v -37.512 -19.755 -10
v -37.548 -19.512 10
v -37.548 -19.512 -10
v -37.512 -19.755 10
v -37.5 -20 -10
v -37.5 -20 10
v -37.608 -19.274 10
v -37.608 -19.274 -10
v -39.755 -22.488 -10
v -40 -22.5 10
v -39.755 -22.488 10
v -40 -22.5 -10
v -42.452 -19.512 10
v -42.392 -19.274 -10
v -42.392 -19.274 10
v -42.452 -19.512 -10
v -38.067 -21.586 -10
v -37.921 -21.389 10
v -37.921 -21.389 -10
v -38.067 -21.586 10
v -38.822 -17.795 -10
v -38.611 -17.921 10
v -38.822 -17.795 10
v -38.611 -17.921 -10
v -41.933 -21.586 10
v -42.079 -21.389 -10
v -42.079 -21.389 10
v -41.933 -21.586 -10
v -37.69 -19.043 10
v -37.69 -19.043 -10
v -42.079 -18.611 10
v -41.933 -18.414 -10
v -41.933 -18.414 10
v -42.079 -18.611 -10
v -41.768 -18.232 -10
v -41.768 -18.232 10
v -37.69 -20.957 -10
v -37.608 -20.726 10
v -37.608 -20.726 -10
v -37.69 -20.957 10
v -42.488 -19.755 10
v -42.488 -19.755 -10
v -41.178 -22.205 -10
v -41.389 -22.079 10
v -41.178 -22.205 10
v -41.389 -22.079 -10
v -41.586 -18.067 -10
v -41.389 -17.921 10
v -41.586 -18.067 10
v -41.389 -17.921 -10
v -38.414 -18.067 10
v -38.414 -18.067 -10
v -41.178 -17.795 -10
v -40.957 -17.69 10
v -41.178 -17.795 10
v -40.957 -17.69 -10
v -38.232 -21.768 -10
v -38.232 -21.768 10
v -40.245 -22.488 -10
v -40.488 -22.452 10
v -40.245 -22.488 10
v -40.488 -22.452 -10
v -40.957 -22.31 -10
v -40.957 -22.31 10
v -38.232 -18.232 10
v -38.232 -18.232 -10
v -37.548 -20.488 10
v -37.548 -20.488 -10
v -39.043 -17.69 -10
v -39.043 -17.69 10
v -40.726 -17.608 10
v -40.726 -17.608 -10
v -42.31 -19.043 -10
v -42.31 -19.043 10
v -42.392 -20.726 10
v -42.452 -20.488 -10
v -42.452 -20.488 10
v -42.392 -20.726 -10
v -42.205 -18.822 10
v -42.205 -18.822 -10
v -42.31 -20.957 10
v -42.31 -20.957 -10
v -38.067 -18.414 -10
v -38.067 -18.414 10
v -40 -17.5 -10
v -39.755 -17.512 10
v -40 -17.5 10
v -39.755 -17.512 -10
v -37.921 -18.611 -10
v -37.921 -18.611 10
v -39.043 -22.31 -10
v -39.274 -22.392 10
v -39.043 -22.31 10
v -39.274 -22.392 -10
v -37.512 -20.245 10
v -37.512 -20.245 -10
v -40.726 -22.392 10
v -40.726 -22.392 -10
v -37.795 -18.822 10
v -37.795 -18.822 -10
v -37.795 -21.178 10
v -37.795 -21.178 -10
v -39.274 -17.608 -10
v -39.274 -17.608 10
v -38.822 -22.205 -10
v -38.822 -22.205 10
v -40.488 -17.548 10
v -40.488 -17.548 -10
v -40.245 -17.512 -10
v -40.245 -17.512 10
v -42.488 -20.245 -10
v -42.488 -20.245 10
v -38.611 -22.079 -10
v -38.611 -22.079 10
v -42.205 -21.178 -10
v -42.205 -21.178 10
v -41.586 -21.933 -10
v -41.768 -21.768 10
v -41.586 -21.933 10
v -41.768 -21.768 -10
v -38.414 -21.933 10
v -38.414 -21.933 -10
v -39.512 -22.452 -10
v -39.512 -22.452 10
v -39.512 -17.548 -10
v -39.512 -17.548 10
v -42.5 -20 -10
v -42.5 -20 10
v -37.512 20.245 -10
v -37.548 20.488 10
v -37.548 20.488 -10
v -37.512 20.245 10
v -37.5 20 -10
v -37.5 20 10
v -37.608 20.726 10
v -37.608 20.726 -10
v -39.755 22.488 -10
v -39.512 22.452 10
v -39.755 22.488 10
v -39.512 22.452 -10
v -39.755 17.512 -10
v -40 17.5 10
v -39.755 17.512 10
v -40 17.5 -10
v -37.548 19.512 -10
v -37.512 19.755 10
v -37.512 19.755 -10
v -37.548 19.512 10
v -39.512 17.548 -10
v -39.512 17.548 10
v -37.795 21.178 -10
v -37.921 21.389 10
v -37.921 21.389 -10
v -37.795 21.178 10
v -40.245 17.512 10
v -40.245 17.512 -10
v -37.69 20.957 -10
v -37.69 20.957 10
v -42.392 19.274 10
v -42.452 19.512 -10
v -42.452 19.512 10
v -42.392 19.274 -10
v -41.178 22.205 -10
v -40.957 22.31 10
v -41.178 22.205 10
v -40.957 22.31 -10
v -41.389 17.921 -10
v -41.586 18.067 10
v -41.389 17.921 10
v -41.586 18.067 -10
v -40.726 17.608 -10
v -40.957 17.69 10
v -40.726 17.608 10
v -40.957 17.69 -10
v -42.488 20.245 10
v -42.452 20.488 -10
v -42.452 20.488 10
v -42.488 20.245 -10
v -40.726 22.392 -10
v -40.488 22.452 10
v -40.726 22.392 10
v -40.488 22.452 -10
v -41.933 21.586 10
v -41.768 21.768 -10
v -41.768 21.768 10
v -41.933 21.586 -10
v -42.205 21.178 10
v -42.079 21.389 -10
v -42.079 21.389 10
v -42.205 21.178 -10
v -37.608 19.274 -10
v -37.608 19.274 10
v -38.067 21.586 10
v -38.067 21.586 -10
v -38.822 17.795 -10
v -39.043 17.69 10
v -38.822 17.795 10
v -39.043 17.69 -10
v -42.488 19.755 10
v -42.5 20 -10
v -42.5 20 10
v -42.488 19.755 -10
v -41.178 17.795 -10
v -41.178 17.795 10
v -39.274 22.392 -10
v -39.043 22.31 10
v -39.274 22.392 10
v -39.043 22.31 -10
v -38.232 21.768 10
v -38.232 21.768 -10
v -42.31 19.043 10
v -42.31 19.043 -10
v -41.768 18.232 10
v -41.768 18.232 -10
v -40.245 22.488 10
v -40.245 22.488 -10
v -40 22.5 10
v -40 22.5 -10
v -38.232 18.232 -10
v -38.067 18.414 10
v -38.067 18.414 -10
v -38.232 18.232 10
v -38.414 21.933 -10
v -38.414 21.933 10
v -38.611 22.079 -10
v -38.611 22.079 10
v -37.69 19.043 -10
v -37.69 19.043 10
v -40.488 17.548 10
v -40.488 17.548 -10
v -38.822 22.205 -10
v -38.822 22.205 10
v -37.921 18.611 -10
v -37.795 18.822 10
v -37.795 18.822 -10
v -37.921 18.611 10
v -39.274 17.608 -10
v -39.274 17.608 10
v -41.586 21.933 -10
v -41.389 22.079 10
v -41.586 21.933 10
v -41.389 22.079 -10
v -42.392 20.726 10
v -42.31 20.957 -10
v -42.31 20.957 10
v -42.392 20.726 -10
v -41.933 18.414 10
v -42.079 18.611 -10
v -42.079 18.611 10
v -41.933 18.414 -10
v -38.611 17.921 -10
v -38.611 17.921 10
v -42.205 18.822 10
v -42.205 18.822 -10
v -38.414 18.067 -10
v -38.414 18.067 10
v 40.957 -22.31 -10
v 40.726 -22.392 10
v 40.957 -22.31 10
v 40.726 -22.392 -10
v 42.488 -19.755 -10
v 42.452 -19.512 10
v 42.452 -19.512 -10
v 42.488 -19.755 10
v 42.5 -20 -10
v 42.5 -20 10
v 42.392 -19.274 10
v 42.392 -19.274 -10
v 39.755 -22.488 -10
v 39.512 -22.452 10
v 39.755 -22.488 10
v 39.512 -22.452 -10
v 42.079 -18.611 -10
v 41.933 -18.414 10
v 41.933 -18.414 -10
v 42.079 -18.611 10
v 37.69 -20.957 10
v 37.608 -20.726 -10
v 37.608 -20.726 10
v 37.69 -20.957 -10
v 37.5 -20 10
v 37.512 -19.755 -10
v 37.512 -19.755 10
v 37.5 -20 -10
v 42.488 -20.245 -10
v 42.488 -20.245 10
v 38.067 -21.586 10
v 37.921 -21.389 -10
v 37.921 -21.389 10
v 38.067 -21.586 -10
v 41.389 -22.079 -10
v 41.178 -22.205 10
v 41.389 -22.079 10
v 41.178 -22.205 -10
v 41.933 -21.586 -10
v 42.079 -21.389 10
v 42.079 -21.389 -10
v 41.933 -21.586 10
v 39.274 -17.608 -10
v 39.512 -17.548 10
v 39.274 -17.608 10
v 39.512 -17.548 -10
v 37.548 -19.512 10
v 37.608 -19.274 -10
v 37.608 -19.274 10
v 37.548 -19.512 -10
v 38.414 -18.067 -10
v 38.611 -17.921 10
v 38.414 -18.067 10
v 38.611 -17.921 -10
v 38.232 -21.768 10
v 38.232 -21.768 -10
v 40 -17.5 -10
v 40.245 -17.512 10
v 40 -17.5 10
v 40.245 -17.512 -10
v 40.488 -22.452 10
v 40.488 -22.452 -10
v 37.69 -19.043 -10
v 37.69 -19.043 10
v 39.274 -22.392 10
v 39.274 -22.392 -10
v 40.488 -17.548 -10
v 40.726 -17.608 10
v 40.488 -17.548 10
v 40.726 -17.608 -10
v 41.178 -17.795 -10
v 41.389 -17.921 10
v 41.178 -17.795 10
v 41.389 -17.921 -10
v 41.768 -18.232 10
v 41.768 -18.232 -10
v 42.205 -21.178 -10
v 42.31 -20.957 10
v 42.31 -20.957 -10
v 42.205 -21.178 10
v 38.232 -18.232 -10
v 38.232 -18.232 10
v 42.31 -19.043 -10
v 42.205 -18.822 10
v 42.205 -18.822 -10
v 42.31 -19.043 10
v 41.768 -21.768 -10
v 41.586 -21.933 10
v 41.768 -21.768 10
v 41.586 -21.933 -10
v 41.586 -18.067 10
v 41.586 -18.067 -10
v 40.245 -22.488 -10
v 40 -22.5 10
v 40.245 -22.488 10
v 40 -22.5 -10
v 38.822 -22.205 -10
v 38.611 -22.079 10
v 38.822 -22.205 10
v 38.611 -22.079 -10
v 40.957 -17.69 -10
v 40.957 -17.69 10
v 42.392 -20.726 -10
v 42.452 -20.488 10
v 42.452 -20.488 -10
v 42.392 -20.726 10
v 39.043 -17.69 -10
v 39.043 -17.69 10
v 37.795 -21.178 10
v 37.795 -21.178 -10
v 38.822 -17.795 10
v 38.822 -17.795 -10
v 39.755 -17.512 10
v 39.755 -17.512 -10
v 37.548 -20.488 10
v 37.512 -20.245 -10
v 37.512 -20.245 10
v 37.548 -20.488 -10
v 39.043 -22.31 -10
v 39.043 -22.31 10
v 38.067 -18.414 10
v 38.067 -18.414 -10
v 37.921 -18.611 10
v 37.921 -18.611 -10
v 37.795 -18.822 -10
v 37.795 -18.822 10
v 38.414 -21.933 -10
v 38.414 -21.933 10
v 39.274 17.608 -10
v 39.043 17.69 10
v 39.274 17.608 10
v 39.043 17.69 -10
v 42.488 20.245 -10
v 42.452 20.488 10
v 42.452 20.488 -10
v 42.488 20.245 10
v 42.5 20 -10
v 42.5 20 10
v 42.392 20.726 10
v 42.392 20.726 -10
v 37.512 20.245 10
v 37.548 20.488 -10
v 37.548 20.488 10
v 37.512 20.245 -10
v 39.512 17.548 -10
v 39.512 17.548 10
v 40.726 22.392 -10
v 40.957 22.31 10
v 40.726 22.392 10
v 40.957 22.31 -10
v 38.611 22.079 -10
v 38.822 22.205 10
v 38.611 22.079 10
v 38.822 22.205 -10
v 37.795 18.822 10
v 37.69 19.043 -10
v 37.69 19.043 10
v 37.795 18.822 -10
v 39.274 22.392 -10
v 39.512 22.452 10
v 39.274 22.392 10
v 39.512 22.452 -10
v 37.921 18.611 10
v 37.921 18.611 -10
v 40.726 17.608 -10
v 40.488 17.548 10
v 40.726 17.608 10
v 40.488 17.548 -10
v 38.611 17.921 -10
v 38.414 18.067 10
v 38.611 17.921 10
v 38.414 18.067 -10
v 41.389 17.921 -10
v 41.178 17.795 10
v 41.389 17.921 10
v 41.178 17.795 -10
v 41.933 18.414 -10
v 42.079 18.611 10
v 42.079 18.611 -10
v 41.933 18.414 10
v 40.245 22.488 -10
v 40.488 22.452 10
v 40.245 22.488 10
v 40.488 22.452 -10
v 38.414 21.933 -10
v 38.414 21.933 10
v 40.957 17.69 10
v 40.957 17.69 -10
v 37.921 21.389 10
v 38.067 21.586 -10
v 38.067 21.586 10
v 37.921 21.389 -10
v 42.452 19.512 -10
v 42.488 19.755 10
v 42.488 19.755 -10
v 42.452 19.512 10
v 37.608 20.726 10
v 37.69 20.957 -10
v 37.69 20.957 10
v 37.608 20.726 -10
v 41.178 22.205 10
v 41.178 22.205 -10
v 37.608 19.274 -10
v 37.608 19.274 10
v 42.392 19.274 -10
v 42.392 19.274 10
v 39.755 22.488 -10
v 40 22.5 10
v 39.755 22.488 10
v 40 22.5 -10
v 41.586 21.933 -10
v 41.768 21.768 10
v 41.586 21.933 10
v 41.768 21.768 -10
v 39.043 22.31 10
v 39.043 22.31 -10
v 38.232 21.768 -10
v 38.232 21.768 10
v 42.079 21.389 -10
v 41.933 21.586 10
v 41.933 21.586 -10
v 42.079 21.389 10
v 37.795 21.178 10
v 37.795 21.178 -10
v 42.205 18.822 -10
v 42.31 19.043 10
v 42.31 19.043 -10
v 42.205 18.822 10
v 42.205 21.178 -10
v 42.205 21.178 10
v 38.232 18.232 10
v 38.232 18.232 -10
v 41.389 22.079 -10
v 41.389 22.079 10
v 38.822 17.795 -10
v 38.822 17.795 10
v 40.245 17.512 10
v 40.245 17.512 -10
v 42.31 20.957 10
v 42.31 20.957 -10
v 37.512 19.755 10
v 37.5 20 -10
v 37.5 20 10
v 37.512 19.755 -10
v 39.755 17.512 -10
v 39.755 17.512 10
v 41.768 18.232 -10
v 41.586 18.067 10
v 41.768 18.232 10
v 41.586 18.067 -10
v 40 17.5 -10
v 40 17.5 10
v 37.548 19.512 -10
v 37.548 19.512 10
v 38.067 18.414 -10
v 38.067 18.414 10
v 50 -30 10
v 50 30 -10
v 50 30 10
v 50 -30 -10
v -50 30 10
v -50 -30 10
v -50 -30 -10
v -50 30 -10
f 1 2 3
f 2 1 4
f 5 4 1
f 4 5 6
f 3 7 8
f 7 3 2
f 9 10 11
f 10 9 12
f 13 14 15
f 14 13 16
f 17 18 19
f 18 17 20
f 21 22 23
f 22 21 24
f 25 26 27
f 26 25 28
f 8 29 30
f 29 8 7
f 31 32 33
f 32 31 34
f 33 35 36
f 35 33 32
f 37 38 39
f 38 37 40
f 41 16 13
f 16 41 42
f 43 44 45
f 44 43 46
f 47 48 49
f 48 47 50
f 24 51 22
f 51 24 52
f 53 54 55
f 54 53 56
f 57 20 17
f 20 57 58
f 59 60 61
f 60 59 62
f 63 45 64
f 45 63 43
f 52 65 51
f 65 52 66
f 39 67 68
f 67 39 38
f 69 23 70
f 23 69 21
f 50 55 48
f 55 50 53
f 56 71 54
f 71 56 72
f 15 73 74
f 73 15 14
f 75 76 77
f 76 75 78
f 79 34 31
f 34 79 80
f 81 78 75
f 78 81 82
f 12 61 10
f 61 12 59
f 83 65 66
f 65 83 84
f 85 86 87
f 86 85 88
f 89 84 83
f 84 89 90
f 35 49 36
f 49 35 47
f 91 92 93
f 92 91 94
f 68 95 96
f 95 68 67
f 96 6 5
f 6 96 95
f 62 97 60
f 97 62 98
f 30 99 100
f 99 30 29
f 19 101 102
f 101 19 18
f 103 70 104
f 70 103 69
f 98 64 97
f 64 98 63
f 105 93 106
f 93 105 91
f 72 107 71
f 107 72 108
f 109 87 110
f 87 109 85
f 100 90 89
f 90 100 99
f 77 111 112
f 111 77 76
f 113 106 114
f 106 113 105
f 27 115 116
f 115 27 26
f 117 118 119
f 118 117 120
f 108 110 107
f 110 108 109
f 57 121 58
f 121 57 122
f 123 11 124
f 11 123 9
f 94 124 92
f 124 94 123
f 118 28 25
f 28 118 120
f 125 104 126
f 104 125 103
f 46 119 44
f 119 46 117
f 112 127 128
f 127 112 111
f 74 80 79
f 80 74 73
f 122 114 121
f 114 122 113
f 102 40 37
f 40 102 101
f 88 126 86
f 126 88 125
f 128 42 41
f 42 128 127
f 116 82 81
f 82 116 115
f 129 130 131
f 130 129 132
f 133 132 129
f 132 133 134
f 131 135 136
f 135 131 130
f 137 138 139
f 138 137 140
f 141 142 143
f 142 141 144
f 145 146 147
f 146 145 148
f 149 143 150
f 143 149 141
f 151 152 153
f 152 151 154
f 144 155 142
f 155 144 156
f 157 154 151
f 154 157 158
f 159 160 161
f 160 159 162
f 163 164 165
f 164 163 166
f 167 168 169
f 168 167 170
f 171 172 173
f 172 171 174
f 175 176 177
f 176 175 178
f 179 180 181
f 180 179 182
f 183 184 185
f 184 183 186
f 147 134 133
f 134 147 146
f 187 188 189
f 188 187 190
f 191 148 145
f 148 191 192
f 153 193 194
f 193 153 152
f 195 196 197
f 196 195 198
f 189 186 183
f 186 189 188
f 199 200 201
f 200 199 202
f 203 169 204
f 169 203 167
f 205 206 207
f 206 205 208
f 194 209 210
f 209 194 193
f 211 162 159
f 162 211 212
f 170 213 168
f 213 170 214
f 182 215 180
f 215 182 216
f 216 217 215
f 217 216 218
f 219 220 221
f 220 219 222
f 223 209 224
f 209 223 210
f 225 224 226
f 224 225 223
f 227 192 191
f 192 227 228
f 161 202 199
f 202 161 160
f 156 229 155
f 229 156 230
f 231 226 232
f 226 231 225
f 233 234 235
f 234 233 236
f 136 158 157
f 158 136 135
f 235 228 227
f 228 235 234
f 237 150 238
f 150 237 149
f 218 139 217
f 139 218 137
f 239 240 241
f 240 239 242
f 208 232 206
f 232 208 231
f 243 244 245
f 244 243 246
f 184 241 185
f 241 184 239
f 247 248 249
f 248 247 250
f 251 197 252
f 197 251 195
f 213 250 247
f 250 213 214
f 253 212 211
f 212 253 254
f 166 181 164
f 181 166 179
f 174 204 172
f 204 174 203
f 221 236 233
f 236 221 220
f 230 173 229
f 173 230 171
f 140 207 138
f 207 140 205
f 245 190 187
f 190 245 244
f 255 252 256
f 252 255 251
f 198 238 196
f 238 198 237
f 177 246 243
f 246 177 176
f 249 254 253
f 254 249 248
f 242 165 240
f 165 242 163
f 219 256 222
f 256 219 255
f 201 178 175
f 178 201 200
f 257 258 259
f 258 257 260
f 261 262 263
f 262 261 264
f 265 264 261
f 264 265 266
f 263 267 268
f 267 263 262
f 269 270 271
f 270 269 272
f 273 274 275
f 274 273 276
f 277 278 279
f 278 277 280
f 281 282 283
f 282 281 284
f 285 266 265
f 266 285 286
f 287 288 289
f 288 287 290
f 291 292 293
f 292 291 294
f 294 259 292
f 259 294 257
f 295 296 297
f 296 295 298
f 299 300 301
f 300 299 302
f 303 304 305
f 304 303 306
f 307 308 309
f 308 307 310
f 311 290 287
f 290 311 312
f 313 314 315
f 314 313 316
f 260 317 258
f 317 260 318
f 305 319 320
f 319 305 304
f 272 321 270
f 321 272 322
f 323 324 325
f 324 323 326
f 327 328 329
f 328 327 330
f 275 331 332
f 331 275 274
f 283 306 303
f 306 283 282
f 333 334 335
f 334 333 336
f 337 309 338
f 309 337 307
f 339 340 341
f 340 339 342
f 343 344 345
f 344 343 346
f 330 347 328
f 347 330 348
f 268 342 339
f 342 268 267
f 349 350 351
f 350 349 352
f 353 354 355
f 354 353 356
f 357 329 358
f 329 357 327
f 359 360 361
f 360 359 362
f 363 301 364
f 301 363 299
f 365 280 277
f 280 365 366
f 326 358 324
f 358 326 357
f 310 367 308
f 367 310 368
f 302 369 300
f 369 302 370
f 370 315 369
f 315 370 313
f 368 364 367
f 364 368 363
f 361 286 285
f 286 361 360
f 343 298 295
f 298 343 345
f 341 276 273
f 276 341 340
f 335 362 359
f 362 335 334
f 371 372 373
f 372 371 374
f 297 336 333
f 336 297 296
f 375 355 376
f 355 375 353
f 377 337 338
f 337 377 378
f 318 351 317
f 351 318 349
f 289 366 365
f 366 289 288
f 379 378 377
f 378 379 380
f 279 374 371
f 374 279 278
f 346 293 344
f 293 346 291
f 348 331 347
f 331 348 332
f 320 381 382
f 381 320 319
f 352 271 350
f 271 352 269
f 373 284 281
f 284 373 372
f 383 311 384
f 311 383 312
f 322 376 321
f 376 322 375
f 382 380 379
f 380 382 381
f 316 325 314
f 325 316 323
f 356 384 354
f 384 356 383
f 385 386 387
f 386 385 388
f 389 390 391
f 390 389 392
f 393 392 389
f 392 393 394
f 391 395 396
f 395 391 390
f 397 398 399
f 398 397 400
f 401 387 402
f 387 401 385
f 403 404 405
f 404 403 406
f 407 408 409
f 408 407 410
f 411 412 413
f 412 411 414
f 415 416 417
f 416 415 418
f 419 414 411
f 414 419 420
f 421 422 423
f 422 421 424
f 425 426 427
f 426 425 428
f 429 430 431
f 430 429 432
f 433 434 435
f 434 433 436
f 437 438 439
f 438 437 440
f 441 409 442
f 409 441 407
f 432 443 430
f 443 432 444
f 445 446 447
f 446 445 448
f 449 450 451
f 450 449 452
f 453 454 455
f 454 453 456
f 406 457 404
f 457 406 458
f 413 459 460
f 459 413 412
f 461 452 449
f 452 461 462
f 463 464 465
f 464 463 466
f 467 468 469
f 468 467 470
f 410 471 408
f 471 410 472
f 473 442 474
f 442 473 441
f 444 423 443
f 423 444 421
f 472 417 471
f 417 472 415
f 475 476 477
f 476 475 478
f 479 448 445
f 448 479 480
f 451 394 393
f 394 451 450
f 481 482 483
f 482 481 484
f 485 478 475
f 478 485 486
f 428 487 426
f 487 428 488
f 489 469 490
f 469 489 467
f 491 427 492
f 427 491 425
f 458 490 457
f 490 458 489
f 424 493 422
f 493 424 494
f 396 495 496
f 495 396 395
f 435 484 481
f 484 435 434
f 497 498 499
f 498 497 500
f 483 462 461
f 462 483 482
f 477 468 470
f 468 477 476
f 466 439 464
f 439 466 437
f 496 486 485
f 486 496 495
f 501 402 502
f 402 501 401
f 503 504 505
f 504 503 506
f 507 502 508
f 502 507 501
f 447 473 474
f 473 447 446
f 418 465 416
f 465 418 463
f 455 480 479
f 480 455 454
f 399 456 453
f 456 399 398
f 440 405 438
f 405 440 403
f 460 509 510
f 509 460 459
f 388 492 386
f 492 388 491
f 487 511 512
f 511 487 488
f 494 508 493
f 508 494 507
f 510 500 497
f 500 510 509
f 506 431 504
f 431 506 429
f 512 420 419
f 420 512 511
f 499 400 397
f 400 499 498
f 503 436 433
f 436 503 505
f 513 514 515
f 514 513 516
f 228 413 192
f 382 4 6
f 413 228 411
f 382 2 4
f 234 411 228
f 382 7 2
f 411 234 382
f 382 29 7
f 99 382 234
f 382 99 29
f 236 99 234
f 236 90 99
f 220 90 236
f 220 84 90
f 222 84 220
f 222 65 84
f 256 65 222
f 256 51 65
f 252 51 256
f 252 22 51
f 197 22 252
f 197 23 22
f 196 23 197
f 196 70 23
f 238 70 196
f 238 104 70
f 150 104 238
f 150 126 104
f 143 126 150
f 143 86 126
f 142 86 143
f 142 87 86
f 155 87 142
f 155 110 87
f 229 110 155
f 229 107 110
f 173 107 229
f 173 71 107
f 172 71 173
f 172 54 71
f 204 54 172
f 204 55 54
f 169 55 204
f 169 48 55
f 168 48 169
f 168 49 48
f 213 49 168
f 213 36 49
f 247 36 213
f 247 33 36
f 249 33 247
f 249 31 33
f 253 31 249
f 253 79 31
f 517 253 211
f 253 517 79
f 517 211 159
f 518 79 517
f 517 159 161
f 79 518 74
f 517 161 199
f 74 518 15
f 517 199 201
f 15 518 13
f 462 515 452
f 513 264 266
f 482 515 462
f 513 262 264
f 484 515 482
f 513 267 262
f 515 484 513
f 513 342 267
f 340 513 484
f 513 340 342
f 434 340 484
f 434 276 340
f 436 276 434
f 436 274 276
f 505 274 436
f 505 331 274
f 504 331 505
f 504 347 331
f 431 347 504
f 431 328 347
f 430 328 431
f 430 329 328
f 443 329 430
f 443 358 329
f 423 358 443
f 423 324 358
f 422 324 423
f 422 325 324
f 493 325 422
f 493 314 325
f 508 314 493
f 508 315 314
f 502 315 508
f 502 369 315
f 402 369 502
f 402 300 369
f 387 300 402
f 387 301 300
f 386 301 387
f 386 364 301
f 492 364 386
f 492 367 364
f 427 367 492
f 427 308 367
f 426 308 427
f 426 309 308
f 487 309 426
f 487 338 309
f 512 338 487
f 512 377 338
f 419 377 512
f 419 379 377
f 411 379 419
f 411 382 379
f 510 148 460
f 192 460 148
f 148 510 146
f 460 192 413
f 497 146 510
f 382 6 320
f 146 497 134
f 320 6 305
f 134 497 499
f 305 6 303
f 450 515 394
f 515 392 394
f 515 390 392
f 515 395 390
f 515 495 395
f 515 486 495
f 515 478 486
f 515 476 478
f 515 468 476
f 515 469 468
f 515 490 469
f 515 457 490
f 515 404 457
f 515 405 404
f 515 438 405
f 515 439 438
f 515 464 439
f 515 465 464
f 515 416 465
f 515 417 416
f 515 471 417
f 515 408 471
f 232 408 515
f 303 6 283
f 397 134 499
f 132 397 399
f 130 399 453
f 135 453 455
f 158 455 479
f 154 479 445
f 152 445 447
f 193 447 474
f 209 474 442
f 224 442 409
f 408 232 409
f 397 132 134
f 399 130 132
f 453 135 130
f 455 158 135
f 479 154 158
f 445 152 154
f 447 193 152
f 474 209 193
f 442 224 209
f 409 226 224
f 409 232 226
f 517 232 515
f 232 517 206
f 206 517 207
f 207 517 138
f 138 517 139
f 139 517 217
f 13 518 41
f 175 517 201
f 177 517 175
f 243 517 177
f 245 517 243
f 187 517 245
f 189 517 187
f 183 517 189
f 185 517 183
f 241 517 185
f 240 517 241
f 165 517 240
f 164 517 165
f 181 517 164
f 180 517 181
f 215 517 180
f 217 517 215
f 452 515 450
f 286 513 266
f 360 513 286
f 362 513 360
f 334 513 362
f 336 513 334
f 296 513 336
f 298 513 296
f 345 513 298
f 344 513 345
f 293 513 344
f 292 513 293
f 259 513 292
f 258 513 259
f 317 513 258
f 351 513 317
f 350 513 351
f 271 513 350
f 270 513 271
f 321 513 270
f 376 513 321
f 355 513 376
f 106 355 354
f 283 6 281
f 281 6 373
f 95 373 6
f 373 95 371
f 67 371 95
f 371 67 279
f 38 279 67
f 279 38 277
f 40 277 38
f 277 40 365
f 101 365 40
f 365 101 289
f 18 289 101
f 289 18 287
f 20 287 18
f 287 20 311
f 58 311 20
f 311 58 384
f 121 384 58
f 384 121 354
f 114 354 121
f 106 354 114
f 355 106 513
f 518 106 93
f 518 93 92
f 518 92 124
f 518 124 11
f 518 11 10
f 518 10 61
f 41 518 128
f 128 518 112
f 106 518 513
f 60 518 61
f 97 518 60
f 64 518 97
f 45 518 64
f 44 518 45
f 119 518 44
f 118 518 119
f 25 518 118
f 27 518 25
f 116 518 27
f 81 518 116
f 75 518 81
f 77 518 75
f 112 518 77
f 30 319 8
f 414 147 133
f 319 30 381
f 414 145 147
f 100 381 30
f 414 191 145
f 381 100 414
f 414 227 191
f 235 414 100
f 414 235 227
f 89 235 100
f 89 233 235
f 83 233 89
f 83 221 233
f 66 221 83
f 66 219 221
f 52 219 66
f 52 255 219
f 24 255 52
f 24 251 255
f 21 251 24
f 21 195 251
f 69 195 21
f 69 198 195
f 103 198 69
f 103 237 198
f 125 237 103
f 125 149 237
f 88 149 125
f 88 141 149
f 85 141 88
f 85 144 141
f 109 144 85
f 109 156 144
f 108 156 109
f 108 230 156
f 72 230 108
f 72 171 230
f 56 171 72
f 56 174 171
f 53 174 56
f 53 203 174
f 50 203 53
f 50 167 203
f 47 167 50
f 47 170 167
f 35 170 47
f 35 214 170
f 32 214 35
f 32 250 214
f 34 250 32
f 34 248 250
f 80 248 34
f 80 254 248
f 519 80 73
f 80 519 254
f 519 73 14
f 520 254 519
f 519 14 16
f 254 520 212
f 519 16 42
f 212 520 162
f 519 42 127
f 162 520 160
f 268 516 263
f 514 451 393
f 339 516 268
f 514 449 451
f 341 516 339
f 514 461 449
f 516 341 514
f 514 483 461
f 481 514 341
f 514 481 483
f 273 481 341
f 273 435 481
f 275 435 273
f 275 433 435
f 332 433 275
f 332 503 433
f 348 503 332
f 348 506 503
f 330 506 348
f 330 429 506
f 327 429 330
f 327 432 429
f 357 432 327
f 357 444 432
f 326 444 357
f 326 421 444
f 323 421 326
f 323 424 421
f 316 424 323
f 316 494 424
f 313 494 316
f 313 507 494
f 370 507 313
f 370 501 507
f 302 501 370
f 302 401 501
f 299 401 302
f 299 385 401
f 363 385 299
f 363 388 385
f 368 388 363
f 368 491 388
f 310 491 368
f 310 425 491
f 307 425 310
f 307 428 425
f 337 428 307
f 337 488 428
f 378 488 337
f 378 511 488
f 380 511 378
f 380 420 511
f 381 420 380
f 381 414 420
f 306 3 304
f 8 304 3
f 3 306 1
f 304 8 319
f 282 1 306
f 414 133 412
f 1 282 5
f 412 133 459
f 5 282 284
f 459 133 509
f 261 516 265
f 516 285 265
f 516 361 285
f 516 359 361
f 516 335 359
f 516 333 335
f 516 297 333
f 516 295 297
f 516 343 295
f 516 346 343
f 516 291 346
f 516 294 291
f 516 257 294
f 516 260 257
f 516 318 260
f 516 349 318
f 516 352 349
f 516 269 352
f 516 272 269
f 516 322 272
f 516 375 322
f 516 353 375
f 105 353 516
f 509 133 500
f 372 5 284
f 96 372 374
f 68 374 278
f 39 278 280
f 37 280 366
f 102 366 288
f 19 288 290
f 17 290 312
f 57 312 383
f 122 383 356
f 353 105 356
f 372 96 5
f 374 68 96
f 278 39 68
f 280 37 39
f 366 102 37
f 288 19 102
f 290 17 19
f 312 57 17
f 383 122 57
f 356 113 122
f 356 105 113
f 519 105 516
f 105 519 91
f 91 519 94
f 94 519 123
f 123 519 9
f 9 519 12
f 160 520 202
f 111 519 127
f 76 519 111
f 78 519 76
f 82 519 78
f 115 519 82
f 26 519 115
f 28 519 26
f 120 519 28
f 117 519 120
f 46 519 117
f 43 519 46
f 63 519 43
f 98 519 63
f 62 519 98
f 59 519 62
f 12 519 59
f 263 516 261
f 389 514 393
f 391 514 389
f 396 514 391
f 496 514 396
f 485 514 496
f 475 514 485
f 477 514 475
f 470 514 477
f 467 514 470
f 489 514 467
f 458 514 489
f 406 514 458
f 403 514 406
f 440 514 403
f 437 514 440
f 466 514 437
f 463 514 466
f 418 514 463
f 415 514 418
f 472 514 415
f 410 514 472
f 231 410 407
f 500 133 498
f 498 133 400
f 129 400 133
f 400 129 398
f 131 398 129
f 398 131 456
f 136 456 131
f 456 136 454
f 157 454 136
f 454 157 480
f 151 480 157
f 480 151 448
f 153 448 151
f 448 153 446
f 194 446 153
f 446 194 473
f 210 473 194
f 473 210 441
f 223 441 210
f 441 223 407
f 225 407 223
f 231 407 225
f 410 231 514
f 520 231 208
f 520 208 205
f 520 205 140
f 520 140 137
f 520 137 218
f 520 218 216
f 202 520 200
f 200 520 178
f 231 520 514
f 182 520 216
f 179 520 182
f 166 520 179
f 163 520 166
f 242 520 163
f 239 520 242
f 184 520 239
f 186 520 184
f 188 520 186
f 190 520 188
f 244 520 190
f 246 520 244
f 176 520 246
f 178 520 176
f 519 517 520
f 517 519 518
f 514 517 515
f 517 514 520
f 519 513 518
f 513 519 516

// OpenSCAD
// Golden (b) — the block.scad block with 4x Ø5mm through-holes, one near each
// corner, 10mm inset from both edges. Each cutter spans well beyond BOTH faces
// it pierces (height = thickness + 2*overshoot, centred on z=0) so it is a real
// through-hole, never a shallow/blind no-op. Simply-connected body with 4 clean
// through-holes -> topological genus 4 (same as a 4-holed torus).
$fn = 64;

length = 100;
width  = 60;
height = 20;
hole_d = 5;
inset  = 10;

module corner_holes() {
    for (x = [-(length/2 - inset), (length/2 - inset)])
        for (y = [-(width/2 - inset), (width/2 - inset)])
            translate([x, y, 0])
                cylinder(h = height + 4, r = hole_d / 2, center = true);
}

difference() {
    cube([length, width, height], center = true);
    corner_holes();
}
